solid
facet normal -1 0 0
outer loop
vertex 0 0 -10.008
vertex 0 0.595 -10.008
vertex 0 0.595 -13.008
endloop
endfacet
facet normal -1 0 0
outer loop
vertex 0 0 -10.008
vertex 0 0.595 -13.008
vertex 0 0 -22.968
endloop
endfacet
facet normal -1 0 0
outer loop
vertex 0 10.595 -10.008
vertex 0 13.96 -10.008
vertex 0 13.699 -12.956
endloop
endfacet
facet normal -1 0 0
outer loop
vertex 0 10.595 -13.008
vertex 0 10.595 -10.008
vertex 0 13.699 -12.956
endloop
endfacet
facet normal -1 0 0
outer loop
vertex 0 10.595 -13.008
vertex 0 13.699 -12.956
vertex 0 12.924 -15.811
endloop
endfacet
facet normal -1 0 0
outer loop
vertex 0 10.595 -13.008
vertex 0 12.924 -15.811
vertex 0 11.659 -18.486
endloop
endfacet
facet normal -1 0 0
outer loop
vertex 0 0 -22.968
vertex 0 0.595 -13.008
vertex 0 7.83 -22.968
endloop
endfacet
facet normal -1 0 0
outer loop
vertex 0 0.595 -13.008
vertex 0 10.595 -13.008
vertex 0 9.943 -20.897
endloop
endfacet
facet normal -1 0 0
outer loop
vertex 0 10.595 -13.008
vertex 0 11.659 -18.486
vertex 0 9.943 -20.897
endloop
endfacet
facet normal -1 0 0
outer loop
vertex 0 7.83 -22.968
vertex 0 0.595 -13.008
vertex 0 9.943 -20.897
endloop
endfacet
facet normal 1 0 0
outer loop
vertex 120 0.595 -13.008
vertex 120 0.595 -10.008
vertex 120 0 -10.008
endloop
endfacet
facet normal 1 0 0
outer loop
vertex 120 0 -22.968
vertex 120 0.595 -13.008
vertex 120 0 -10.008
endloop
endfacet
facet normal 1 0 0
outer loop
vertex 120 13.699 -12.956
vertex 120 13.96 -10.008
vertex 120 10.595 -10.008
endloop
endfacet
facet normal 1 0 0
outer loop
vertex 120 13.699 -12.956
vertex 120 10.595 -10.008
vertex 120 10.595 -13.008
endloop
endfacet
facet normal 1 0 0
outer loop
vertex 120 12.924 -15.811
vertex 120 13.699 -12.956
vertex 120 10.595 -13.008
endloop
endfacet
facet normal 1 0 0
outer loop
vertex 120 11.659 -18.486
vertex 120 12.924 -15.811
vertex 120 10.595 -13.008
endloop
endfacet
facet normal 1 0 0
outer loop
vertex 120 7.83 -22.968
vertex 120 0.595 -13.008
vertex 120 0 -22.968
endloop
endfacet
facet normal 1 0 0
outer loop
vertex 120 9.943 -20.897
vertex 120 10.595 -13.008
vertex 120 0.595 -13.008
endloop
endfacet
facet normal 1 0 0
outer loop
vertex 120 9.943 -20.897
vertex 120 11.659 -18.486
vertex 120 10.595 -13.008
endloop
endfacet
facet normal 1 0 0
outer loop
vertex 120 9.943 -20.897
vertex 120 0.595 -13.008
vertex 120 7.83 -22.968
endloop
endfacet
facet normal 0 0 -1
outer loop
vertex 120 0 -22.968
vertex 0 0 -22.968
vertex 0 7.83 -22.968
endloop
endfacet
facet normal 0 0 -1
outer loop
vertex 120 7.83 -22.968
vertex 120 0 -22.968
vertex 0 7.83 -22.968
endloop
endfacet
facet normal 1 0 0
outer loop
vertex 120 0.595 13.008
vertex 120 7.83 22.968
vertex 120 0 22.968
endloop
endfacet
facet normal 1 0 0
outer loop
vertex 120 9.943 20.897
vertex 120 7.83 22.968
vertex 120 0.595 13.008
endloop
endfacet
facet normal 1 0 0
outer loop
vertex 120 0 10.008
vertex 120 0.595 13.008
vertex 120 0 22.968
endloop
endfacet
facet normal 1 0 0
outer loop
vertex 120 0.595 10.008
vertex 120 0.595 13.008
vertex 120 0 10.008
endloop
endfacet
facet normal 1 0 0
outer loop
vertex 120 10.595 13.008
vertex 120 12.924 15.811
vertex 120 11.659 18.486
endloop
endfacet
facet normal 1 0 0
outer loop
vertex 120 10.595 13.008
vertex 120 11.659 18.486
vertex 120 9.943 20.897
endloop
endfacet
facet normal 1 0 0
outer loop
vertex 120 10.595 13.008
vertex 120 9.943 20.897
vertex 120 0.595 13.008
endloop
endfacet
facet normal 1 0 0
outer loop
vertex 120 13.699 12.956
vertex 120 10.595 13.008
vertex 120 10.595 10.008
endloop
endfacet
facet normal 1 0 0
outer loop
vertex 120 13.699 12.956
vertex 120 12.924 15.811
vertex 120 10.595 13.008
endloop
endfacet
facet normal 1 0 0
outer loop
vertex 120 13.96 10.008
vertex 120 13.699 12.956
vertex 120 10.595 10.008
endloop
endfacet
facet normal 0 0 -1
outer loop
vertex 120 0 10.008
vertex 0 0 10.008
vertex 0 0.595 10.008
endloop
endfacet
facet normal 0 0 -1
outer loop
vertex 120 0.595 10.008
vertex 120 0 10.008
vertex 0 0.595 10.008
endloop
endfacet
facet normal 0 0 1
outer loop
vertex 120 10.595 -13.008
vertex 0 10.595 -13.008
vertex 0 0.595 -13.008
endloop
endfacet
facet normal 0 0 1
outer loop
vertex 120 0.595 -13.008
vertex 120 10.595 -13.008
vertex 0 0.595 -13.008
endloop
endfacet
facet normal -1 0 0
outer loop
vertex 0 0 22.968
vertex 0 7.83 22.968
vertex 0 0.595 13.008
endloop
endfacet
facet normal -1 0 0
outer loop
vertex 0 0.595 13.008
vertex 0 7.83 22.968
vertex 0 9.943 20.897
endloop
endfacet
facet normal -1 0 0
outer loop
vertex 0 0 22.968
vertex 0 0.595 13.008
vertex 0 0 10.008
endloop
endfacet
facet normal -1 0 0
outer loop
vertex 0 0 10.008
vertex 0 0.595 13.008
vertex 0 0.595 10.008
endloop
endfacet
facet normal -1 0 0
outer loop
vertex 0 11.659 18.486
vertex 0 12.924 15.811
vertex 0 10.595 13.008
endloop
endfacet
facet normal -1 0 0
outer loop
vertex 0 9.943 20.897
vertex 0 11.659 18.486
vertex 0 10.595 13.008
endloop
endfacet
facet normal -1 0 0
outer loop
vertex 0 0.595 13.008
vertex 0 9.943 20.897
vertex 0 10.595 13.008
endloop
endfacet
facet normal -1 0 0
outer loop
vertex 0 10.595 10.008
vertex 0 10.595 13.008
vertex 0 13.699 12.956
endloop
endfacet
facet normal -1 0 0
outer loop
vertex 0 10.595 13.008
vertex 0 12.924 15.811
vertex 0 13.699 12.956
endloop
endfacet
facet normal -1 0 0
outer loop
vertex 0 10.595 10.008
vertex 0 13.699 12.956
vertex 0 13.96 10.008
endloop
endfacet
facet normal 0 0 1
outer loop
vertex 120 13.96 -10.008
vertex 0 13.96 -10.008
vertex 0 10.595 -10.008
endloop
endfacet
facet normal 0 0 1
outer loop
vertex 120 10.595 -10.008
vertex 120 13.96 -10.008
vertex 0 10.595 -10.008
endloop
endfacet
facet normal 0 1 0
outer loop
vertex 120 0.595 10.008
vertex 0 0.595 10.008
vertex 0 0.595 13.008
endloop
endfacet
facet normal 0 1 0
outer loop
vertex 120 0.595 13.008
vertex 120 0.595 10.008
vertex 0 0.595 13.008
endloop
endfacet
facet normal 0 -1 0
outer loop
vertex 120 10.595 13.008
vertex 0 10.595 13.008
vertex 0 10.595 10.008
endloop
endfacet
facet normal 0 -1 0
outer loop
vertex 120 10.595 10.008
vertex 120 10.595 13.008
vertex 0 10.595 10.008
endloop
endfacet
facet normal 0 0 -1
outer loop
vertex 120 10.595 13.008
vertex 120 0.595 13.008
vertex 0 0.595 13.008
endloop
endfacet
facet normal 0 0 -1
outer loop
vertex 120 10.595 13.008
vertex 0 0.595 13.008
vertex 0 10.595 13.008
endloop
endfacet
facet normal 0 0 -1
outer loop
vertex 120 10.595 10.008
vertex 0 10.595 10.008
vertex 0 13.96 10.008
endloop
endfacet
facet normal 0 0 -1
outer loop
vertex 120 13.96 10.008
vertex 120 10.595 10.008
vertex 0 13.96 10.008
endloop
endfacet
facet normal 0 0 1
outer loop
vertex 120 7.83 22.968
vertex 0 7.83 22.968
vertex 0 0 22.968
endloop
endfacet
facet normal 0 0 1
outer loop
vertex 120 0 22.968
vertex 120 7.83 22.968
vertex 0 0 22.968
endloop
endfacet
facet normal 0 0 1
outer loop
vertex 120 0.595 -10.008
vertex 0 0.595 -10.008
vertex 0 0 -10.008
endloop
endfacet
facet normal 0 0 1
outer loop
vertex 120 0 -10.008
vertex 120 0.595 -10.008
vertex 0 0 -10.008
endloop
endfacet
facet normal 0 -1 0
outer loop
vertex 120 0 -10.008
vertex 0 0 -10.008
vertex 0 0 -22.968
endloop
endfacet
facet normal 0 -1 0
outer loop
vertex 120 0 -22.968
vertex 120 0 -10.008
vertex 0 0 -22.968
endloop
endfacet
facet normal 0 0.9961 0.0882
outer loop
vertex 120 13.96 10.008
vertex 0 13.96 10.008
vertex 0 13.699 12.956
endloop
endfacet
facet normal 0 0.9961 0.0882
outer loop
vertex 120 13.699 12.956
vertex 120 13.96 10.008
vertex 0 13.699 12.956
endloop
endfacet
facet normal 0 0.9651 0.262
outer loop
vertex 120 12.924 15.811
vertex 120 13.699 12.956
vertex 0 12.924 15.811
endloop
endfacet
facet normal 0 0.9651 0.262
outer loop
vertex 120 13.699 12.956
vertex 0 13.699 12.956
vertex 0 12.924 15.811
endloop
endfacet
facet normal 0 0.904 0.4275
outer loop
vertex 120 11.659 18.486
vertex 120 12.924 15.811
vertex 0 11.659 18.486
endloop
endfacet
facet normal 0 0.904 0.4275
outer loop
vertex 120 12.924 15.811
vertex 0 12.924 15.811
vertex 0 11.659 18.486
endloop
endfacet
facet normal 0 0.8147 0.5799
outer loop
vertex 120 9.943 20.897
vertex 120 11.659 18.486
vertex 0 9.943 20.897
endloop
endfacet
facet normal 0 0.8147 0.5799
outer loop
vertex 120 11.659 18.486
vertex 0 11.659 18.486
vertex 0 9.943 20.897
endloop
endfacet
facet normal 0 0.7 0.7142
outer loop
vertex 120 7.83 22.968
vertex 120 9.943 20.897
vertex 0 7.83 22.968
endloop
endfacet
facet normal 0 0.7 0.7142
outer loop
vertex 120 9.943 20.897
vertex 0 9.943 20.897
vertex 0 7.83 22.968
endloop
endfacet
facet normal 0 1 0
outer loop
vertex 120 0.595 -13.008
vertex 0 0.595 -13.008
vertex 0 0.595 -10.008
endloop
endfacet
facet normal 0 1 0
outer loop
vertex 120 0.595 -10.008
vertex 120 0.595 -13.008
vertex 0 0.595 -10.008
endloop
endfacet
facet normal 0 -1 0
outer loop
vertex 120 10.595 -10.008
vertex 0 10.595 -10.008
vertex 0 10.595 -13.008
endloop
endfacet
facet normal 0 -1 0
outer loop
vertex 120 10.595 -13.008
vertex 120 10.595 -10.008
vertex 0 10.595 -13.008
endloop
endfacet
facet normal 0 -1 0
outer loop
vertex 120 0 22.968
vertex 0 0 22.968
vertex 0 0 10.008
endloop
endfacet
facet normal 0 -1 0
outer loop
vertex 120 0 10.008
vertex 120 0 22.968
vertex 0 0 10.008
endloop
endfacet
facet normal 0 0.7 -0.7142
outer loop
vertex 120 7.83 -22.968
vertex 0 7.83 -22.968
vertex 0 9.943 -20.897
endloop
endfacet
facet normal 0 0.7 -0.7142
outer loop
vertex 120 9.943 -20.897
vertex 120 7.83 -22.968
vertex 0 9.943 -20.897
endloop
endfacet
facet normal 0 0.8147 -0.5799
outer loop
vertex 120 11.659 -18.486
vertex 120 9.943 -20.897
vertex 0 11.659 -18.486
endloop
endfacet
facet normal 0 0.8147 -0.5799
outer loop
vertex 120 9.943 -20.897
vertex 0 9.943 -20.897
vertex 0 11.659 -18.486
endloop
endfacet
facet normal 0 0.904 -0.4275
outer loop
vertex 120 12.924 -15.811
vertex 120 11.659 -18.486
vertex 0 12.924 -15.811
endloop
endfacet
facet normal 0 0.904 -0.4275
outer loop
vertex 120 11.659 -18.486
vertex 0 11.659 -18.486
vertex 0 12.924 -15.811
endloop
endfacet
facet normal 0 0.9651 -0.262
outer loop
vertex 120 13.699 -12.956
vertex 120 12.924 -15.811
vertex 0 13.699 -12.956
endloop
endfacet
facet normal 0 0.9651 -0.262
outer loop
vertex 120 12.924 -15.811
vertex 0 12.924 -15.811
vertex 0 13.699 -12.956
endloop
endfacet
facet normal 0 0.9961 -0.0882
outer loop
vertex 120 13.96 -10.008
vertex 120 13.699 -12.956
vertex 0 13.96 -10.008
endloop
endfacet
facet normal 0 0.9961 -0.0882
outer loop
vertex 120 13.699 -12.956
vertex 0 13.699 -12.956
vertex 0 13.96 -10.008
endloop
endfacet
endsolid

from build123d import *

# Parameters (mm, degrees)
BOSS_EXTRUDE1_DEPTH   = 120
BOSS_EXTRUDE1_2_DEPTH = 120


with BuildPart() as part:
    # Sketch3 → Boss-Extrude1 (new body)
    with BuildSketch(Plane(origin=(0, 0, -10), x_dir=(0, 0, -1), z_dir=(1, 0, 0))):
        with BuildLine():
            Line((0.008344509, 0), (12.968344509, 0))
            Line((12.968344509, 0), (12.968344509, 7.83))
            ThreePointArc((12.968344509, 7.83), (7.176651492, 12.350213458), (0.008344509, 13.96))
            Line((0.008344509, 13.96), (0.008344509, 10.59476024))
            Line((0.008344509, 10.59476024), (3.008344509, 10.59476024))
            Line((3.008344509, 10.59476024), (3.008344509, 0.59476024))
            Line((3.008344509, 0.59476024), (0.008344509, 0.59476024))
            Line((0.008344509, 0.59476024), (0.008344509, 0))
        make_face()
    extrude(amount=BOSS_EXTRUDE1_DEPTH)


with BuildPart() as body_2:
    # Sketch3 → Boss-Extrude1 2 (new body)
    with BuildSketch(Plane(origin=(0, 0, -10), x_dir=(0, 0, -1), z_dir=(1, 0, 0))):
        with BuildLine():
            Line((-20.008344509, 10.59476024), (-20.008344509, 13.96))
            ThreePointArc((-20.008344509, 13.96), (-27.176651492, 12.350213458), (-32.968344509, 7.83))
            Line((-32.968344509, 7.83), (-32.968344509, 0))
            Line((-32.968344509, 0), (-20.008344509, 0))
            Line((-20.008344509, 0), (-20.008344509, 0.59476024))
            Line((-20.008344509, 0.59476024), (-23.008344509, 0.59476024))
            Line((-23.008344509, 0.59476024), (-23.008344509, 10.59476024))
            Line((-23.008344509, 10.59476024), (-20.008344509, 10.59476024))
        make_face()
    extrude(amount=BOSS_EXTRUDE1_2_DEPTH)


solid = Compound([part.part, body_2.part])
